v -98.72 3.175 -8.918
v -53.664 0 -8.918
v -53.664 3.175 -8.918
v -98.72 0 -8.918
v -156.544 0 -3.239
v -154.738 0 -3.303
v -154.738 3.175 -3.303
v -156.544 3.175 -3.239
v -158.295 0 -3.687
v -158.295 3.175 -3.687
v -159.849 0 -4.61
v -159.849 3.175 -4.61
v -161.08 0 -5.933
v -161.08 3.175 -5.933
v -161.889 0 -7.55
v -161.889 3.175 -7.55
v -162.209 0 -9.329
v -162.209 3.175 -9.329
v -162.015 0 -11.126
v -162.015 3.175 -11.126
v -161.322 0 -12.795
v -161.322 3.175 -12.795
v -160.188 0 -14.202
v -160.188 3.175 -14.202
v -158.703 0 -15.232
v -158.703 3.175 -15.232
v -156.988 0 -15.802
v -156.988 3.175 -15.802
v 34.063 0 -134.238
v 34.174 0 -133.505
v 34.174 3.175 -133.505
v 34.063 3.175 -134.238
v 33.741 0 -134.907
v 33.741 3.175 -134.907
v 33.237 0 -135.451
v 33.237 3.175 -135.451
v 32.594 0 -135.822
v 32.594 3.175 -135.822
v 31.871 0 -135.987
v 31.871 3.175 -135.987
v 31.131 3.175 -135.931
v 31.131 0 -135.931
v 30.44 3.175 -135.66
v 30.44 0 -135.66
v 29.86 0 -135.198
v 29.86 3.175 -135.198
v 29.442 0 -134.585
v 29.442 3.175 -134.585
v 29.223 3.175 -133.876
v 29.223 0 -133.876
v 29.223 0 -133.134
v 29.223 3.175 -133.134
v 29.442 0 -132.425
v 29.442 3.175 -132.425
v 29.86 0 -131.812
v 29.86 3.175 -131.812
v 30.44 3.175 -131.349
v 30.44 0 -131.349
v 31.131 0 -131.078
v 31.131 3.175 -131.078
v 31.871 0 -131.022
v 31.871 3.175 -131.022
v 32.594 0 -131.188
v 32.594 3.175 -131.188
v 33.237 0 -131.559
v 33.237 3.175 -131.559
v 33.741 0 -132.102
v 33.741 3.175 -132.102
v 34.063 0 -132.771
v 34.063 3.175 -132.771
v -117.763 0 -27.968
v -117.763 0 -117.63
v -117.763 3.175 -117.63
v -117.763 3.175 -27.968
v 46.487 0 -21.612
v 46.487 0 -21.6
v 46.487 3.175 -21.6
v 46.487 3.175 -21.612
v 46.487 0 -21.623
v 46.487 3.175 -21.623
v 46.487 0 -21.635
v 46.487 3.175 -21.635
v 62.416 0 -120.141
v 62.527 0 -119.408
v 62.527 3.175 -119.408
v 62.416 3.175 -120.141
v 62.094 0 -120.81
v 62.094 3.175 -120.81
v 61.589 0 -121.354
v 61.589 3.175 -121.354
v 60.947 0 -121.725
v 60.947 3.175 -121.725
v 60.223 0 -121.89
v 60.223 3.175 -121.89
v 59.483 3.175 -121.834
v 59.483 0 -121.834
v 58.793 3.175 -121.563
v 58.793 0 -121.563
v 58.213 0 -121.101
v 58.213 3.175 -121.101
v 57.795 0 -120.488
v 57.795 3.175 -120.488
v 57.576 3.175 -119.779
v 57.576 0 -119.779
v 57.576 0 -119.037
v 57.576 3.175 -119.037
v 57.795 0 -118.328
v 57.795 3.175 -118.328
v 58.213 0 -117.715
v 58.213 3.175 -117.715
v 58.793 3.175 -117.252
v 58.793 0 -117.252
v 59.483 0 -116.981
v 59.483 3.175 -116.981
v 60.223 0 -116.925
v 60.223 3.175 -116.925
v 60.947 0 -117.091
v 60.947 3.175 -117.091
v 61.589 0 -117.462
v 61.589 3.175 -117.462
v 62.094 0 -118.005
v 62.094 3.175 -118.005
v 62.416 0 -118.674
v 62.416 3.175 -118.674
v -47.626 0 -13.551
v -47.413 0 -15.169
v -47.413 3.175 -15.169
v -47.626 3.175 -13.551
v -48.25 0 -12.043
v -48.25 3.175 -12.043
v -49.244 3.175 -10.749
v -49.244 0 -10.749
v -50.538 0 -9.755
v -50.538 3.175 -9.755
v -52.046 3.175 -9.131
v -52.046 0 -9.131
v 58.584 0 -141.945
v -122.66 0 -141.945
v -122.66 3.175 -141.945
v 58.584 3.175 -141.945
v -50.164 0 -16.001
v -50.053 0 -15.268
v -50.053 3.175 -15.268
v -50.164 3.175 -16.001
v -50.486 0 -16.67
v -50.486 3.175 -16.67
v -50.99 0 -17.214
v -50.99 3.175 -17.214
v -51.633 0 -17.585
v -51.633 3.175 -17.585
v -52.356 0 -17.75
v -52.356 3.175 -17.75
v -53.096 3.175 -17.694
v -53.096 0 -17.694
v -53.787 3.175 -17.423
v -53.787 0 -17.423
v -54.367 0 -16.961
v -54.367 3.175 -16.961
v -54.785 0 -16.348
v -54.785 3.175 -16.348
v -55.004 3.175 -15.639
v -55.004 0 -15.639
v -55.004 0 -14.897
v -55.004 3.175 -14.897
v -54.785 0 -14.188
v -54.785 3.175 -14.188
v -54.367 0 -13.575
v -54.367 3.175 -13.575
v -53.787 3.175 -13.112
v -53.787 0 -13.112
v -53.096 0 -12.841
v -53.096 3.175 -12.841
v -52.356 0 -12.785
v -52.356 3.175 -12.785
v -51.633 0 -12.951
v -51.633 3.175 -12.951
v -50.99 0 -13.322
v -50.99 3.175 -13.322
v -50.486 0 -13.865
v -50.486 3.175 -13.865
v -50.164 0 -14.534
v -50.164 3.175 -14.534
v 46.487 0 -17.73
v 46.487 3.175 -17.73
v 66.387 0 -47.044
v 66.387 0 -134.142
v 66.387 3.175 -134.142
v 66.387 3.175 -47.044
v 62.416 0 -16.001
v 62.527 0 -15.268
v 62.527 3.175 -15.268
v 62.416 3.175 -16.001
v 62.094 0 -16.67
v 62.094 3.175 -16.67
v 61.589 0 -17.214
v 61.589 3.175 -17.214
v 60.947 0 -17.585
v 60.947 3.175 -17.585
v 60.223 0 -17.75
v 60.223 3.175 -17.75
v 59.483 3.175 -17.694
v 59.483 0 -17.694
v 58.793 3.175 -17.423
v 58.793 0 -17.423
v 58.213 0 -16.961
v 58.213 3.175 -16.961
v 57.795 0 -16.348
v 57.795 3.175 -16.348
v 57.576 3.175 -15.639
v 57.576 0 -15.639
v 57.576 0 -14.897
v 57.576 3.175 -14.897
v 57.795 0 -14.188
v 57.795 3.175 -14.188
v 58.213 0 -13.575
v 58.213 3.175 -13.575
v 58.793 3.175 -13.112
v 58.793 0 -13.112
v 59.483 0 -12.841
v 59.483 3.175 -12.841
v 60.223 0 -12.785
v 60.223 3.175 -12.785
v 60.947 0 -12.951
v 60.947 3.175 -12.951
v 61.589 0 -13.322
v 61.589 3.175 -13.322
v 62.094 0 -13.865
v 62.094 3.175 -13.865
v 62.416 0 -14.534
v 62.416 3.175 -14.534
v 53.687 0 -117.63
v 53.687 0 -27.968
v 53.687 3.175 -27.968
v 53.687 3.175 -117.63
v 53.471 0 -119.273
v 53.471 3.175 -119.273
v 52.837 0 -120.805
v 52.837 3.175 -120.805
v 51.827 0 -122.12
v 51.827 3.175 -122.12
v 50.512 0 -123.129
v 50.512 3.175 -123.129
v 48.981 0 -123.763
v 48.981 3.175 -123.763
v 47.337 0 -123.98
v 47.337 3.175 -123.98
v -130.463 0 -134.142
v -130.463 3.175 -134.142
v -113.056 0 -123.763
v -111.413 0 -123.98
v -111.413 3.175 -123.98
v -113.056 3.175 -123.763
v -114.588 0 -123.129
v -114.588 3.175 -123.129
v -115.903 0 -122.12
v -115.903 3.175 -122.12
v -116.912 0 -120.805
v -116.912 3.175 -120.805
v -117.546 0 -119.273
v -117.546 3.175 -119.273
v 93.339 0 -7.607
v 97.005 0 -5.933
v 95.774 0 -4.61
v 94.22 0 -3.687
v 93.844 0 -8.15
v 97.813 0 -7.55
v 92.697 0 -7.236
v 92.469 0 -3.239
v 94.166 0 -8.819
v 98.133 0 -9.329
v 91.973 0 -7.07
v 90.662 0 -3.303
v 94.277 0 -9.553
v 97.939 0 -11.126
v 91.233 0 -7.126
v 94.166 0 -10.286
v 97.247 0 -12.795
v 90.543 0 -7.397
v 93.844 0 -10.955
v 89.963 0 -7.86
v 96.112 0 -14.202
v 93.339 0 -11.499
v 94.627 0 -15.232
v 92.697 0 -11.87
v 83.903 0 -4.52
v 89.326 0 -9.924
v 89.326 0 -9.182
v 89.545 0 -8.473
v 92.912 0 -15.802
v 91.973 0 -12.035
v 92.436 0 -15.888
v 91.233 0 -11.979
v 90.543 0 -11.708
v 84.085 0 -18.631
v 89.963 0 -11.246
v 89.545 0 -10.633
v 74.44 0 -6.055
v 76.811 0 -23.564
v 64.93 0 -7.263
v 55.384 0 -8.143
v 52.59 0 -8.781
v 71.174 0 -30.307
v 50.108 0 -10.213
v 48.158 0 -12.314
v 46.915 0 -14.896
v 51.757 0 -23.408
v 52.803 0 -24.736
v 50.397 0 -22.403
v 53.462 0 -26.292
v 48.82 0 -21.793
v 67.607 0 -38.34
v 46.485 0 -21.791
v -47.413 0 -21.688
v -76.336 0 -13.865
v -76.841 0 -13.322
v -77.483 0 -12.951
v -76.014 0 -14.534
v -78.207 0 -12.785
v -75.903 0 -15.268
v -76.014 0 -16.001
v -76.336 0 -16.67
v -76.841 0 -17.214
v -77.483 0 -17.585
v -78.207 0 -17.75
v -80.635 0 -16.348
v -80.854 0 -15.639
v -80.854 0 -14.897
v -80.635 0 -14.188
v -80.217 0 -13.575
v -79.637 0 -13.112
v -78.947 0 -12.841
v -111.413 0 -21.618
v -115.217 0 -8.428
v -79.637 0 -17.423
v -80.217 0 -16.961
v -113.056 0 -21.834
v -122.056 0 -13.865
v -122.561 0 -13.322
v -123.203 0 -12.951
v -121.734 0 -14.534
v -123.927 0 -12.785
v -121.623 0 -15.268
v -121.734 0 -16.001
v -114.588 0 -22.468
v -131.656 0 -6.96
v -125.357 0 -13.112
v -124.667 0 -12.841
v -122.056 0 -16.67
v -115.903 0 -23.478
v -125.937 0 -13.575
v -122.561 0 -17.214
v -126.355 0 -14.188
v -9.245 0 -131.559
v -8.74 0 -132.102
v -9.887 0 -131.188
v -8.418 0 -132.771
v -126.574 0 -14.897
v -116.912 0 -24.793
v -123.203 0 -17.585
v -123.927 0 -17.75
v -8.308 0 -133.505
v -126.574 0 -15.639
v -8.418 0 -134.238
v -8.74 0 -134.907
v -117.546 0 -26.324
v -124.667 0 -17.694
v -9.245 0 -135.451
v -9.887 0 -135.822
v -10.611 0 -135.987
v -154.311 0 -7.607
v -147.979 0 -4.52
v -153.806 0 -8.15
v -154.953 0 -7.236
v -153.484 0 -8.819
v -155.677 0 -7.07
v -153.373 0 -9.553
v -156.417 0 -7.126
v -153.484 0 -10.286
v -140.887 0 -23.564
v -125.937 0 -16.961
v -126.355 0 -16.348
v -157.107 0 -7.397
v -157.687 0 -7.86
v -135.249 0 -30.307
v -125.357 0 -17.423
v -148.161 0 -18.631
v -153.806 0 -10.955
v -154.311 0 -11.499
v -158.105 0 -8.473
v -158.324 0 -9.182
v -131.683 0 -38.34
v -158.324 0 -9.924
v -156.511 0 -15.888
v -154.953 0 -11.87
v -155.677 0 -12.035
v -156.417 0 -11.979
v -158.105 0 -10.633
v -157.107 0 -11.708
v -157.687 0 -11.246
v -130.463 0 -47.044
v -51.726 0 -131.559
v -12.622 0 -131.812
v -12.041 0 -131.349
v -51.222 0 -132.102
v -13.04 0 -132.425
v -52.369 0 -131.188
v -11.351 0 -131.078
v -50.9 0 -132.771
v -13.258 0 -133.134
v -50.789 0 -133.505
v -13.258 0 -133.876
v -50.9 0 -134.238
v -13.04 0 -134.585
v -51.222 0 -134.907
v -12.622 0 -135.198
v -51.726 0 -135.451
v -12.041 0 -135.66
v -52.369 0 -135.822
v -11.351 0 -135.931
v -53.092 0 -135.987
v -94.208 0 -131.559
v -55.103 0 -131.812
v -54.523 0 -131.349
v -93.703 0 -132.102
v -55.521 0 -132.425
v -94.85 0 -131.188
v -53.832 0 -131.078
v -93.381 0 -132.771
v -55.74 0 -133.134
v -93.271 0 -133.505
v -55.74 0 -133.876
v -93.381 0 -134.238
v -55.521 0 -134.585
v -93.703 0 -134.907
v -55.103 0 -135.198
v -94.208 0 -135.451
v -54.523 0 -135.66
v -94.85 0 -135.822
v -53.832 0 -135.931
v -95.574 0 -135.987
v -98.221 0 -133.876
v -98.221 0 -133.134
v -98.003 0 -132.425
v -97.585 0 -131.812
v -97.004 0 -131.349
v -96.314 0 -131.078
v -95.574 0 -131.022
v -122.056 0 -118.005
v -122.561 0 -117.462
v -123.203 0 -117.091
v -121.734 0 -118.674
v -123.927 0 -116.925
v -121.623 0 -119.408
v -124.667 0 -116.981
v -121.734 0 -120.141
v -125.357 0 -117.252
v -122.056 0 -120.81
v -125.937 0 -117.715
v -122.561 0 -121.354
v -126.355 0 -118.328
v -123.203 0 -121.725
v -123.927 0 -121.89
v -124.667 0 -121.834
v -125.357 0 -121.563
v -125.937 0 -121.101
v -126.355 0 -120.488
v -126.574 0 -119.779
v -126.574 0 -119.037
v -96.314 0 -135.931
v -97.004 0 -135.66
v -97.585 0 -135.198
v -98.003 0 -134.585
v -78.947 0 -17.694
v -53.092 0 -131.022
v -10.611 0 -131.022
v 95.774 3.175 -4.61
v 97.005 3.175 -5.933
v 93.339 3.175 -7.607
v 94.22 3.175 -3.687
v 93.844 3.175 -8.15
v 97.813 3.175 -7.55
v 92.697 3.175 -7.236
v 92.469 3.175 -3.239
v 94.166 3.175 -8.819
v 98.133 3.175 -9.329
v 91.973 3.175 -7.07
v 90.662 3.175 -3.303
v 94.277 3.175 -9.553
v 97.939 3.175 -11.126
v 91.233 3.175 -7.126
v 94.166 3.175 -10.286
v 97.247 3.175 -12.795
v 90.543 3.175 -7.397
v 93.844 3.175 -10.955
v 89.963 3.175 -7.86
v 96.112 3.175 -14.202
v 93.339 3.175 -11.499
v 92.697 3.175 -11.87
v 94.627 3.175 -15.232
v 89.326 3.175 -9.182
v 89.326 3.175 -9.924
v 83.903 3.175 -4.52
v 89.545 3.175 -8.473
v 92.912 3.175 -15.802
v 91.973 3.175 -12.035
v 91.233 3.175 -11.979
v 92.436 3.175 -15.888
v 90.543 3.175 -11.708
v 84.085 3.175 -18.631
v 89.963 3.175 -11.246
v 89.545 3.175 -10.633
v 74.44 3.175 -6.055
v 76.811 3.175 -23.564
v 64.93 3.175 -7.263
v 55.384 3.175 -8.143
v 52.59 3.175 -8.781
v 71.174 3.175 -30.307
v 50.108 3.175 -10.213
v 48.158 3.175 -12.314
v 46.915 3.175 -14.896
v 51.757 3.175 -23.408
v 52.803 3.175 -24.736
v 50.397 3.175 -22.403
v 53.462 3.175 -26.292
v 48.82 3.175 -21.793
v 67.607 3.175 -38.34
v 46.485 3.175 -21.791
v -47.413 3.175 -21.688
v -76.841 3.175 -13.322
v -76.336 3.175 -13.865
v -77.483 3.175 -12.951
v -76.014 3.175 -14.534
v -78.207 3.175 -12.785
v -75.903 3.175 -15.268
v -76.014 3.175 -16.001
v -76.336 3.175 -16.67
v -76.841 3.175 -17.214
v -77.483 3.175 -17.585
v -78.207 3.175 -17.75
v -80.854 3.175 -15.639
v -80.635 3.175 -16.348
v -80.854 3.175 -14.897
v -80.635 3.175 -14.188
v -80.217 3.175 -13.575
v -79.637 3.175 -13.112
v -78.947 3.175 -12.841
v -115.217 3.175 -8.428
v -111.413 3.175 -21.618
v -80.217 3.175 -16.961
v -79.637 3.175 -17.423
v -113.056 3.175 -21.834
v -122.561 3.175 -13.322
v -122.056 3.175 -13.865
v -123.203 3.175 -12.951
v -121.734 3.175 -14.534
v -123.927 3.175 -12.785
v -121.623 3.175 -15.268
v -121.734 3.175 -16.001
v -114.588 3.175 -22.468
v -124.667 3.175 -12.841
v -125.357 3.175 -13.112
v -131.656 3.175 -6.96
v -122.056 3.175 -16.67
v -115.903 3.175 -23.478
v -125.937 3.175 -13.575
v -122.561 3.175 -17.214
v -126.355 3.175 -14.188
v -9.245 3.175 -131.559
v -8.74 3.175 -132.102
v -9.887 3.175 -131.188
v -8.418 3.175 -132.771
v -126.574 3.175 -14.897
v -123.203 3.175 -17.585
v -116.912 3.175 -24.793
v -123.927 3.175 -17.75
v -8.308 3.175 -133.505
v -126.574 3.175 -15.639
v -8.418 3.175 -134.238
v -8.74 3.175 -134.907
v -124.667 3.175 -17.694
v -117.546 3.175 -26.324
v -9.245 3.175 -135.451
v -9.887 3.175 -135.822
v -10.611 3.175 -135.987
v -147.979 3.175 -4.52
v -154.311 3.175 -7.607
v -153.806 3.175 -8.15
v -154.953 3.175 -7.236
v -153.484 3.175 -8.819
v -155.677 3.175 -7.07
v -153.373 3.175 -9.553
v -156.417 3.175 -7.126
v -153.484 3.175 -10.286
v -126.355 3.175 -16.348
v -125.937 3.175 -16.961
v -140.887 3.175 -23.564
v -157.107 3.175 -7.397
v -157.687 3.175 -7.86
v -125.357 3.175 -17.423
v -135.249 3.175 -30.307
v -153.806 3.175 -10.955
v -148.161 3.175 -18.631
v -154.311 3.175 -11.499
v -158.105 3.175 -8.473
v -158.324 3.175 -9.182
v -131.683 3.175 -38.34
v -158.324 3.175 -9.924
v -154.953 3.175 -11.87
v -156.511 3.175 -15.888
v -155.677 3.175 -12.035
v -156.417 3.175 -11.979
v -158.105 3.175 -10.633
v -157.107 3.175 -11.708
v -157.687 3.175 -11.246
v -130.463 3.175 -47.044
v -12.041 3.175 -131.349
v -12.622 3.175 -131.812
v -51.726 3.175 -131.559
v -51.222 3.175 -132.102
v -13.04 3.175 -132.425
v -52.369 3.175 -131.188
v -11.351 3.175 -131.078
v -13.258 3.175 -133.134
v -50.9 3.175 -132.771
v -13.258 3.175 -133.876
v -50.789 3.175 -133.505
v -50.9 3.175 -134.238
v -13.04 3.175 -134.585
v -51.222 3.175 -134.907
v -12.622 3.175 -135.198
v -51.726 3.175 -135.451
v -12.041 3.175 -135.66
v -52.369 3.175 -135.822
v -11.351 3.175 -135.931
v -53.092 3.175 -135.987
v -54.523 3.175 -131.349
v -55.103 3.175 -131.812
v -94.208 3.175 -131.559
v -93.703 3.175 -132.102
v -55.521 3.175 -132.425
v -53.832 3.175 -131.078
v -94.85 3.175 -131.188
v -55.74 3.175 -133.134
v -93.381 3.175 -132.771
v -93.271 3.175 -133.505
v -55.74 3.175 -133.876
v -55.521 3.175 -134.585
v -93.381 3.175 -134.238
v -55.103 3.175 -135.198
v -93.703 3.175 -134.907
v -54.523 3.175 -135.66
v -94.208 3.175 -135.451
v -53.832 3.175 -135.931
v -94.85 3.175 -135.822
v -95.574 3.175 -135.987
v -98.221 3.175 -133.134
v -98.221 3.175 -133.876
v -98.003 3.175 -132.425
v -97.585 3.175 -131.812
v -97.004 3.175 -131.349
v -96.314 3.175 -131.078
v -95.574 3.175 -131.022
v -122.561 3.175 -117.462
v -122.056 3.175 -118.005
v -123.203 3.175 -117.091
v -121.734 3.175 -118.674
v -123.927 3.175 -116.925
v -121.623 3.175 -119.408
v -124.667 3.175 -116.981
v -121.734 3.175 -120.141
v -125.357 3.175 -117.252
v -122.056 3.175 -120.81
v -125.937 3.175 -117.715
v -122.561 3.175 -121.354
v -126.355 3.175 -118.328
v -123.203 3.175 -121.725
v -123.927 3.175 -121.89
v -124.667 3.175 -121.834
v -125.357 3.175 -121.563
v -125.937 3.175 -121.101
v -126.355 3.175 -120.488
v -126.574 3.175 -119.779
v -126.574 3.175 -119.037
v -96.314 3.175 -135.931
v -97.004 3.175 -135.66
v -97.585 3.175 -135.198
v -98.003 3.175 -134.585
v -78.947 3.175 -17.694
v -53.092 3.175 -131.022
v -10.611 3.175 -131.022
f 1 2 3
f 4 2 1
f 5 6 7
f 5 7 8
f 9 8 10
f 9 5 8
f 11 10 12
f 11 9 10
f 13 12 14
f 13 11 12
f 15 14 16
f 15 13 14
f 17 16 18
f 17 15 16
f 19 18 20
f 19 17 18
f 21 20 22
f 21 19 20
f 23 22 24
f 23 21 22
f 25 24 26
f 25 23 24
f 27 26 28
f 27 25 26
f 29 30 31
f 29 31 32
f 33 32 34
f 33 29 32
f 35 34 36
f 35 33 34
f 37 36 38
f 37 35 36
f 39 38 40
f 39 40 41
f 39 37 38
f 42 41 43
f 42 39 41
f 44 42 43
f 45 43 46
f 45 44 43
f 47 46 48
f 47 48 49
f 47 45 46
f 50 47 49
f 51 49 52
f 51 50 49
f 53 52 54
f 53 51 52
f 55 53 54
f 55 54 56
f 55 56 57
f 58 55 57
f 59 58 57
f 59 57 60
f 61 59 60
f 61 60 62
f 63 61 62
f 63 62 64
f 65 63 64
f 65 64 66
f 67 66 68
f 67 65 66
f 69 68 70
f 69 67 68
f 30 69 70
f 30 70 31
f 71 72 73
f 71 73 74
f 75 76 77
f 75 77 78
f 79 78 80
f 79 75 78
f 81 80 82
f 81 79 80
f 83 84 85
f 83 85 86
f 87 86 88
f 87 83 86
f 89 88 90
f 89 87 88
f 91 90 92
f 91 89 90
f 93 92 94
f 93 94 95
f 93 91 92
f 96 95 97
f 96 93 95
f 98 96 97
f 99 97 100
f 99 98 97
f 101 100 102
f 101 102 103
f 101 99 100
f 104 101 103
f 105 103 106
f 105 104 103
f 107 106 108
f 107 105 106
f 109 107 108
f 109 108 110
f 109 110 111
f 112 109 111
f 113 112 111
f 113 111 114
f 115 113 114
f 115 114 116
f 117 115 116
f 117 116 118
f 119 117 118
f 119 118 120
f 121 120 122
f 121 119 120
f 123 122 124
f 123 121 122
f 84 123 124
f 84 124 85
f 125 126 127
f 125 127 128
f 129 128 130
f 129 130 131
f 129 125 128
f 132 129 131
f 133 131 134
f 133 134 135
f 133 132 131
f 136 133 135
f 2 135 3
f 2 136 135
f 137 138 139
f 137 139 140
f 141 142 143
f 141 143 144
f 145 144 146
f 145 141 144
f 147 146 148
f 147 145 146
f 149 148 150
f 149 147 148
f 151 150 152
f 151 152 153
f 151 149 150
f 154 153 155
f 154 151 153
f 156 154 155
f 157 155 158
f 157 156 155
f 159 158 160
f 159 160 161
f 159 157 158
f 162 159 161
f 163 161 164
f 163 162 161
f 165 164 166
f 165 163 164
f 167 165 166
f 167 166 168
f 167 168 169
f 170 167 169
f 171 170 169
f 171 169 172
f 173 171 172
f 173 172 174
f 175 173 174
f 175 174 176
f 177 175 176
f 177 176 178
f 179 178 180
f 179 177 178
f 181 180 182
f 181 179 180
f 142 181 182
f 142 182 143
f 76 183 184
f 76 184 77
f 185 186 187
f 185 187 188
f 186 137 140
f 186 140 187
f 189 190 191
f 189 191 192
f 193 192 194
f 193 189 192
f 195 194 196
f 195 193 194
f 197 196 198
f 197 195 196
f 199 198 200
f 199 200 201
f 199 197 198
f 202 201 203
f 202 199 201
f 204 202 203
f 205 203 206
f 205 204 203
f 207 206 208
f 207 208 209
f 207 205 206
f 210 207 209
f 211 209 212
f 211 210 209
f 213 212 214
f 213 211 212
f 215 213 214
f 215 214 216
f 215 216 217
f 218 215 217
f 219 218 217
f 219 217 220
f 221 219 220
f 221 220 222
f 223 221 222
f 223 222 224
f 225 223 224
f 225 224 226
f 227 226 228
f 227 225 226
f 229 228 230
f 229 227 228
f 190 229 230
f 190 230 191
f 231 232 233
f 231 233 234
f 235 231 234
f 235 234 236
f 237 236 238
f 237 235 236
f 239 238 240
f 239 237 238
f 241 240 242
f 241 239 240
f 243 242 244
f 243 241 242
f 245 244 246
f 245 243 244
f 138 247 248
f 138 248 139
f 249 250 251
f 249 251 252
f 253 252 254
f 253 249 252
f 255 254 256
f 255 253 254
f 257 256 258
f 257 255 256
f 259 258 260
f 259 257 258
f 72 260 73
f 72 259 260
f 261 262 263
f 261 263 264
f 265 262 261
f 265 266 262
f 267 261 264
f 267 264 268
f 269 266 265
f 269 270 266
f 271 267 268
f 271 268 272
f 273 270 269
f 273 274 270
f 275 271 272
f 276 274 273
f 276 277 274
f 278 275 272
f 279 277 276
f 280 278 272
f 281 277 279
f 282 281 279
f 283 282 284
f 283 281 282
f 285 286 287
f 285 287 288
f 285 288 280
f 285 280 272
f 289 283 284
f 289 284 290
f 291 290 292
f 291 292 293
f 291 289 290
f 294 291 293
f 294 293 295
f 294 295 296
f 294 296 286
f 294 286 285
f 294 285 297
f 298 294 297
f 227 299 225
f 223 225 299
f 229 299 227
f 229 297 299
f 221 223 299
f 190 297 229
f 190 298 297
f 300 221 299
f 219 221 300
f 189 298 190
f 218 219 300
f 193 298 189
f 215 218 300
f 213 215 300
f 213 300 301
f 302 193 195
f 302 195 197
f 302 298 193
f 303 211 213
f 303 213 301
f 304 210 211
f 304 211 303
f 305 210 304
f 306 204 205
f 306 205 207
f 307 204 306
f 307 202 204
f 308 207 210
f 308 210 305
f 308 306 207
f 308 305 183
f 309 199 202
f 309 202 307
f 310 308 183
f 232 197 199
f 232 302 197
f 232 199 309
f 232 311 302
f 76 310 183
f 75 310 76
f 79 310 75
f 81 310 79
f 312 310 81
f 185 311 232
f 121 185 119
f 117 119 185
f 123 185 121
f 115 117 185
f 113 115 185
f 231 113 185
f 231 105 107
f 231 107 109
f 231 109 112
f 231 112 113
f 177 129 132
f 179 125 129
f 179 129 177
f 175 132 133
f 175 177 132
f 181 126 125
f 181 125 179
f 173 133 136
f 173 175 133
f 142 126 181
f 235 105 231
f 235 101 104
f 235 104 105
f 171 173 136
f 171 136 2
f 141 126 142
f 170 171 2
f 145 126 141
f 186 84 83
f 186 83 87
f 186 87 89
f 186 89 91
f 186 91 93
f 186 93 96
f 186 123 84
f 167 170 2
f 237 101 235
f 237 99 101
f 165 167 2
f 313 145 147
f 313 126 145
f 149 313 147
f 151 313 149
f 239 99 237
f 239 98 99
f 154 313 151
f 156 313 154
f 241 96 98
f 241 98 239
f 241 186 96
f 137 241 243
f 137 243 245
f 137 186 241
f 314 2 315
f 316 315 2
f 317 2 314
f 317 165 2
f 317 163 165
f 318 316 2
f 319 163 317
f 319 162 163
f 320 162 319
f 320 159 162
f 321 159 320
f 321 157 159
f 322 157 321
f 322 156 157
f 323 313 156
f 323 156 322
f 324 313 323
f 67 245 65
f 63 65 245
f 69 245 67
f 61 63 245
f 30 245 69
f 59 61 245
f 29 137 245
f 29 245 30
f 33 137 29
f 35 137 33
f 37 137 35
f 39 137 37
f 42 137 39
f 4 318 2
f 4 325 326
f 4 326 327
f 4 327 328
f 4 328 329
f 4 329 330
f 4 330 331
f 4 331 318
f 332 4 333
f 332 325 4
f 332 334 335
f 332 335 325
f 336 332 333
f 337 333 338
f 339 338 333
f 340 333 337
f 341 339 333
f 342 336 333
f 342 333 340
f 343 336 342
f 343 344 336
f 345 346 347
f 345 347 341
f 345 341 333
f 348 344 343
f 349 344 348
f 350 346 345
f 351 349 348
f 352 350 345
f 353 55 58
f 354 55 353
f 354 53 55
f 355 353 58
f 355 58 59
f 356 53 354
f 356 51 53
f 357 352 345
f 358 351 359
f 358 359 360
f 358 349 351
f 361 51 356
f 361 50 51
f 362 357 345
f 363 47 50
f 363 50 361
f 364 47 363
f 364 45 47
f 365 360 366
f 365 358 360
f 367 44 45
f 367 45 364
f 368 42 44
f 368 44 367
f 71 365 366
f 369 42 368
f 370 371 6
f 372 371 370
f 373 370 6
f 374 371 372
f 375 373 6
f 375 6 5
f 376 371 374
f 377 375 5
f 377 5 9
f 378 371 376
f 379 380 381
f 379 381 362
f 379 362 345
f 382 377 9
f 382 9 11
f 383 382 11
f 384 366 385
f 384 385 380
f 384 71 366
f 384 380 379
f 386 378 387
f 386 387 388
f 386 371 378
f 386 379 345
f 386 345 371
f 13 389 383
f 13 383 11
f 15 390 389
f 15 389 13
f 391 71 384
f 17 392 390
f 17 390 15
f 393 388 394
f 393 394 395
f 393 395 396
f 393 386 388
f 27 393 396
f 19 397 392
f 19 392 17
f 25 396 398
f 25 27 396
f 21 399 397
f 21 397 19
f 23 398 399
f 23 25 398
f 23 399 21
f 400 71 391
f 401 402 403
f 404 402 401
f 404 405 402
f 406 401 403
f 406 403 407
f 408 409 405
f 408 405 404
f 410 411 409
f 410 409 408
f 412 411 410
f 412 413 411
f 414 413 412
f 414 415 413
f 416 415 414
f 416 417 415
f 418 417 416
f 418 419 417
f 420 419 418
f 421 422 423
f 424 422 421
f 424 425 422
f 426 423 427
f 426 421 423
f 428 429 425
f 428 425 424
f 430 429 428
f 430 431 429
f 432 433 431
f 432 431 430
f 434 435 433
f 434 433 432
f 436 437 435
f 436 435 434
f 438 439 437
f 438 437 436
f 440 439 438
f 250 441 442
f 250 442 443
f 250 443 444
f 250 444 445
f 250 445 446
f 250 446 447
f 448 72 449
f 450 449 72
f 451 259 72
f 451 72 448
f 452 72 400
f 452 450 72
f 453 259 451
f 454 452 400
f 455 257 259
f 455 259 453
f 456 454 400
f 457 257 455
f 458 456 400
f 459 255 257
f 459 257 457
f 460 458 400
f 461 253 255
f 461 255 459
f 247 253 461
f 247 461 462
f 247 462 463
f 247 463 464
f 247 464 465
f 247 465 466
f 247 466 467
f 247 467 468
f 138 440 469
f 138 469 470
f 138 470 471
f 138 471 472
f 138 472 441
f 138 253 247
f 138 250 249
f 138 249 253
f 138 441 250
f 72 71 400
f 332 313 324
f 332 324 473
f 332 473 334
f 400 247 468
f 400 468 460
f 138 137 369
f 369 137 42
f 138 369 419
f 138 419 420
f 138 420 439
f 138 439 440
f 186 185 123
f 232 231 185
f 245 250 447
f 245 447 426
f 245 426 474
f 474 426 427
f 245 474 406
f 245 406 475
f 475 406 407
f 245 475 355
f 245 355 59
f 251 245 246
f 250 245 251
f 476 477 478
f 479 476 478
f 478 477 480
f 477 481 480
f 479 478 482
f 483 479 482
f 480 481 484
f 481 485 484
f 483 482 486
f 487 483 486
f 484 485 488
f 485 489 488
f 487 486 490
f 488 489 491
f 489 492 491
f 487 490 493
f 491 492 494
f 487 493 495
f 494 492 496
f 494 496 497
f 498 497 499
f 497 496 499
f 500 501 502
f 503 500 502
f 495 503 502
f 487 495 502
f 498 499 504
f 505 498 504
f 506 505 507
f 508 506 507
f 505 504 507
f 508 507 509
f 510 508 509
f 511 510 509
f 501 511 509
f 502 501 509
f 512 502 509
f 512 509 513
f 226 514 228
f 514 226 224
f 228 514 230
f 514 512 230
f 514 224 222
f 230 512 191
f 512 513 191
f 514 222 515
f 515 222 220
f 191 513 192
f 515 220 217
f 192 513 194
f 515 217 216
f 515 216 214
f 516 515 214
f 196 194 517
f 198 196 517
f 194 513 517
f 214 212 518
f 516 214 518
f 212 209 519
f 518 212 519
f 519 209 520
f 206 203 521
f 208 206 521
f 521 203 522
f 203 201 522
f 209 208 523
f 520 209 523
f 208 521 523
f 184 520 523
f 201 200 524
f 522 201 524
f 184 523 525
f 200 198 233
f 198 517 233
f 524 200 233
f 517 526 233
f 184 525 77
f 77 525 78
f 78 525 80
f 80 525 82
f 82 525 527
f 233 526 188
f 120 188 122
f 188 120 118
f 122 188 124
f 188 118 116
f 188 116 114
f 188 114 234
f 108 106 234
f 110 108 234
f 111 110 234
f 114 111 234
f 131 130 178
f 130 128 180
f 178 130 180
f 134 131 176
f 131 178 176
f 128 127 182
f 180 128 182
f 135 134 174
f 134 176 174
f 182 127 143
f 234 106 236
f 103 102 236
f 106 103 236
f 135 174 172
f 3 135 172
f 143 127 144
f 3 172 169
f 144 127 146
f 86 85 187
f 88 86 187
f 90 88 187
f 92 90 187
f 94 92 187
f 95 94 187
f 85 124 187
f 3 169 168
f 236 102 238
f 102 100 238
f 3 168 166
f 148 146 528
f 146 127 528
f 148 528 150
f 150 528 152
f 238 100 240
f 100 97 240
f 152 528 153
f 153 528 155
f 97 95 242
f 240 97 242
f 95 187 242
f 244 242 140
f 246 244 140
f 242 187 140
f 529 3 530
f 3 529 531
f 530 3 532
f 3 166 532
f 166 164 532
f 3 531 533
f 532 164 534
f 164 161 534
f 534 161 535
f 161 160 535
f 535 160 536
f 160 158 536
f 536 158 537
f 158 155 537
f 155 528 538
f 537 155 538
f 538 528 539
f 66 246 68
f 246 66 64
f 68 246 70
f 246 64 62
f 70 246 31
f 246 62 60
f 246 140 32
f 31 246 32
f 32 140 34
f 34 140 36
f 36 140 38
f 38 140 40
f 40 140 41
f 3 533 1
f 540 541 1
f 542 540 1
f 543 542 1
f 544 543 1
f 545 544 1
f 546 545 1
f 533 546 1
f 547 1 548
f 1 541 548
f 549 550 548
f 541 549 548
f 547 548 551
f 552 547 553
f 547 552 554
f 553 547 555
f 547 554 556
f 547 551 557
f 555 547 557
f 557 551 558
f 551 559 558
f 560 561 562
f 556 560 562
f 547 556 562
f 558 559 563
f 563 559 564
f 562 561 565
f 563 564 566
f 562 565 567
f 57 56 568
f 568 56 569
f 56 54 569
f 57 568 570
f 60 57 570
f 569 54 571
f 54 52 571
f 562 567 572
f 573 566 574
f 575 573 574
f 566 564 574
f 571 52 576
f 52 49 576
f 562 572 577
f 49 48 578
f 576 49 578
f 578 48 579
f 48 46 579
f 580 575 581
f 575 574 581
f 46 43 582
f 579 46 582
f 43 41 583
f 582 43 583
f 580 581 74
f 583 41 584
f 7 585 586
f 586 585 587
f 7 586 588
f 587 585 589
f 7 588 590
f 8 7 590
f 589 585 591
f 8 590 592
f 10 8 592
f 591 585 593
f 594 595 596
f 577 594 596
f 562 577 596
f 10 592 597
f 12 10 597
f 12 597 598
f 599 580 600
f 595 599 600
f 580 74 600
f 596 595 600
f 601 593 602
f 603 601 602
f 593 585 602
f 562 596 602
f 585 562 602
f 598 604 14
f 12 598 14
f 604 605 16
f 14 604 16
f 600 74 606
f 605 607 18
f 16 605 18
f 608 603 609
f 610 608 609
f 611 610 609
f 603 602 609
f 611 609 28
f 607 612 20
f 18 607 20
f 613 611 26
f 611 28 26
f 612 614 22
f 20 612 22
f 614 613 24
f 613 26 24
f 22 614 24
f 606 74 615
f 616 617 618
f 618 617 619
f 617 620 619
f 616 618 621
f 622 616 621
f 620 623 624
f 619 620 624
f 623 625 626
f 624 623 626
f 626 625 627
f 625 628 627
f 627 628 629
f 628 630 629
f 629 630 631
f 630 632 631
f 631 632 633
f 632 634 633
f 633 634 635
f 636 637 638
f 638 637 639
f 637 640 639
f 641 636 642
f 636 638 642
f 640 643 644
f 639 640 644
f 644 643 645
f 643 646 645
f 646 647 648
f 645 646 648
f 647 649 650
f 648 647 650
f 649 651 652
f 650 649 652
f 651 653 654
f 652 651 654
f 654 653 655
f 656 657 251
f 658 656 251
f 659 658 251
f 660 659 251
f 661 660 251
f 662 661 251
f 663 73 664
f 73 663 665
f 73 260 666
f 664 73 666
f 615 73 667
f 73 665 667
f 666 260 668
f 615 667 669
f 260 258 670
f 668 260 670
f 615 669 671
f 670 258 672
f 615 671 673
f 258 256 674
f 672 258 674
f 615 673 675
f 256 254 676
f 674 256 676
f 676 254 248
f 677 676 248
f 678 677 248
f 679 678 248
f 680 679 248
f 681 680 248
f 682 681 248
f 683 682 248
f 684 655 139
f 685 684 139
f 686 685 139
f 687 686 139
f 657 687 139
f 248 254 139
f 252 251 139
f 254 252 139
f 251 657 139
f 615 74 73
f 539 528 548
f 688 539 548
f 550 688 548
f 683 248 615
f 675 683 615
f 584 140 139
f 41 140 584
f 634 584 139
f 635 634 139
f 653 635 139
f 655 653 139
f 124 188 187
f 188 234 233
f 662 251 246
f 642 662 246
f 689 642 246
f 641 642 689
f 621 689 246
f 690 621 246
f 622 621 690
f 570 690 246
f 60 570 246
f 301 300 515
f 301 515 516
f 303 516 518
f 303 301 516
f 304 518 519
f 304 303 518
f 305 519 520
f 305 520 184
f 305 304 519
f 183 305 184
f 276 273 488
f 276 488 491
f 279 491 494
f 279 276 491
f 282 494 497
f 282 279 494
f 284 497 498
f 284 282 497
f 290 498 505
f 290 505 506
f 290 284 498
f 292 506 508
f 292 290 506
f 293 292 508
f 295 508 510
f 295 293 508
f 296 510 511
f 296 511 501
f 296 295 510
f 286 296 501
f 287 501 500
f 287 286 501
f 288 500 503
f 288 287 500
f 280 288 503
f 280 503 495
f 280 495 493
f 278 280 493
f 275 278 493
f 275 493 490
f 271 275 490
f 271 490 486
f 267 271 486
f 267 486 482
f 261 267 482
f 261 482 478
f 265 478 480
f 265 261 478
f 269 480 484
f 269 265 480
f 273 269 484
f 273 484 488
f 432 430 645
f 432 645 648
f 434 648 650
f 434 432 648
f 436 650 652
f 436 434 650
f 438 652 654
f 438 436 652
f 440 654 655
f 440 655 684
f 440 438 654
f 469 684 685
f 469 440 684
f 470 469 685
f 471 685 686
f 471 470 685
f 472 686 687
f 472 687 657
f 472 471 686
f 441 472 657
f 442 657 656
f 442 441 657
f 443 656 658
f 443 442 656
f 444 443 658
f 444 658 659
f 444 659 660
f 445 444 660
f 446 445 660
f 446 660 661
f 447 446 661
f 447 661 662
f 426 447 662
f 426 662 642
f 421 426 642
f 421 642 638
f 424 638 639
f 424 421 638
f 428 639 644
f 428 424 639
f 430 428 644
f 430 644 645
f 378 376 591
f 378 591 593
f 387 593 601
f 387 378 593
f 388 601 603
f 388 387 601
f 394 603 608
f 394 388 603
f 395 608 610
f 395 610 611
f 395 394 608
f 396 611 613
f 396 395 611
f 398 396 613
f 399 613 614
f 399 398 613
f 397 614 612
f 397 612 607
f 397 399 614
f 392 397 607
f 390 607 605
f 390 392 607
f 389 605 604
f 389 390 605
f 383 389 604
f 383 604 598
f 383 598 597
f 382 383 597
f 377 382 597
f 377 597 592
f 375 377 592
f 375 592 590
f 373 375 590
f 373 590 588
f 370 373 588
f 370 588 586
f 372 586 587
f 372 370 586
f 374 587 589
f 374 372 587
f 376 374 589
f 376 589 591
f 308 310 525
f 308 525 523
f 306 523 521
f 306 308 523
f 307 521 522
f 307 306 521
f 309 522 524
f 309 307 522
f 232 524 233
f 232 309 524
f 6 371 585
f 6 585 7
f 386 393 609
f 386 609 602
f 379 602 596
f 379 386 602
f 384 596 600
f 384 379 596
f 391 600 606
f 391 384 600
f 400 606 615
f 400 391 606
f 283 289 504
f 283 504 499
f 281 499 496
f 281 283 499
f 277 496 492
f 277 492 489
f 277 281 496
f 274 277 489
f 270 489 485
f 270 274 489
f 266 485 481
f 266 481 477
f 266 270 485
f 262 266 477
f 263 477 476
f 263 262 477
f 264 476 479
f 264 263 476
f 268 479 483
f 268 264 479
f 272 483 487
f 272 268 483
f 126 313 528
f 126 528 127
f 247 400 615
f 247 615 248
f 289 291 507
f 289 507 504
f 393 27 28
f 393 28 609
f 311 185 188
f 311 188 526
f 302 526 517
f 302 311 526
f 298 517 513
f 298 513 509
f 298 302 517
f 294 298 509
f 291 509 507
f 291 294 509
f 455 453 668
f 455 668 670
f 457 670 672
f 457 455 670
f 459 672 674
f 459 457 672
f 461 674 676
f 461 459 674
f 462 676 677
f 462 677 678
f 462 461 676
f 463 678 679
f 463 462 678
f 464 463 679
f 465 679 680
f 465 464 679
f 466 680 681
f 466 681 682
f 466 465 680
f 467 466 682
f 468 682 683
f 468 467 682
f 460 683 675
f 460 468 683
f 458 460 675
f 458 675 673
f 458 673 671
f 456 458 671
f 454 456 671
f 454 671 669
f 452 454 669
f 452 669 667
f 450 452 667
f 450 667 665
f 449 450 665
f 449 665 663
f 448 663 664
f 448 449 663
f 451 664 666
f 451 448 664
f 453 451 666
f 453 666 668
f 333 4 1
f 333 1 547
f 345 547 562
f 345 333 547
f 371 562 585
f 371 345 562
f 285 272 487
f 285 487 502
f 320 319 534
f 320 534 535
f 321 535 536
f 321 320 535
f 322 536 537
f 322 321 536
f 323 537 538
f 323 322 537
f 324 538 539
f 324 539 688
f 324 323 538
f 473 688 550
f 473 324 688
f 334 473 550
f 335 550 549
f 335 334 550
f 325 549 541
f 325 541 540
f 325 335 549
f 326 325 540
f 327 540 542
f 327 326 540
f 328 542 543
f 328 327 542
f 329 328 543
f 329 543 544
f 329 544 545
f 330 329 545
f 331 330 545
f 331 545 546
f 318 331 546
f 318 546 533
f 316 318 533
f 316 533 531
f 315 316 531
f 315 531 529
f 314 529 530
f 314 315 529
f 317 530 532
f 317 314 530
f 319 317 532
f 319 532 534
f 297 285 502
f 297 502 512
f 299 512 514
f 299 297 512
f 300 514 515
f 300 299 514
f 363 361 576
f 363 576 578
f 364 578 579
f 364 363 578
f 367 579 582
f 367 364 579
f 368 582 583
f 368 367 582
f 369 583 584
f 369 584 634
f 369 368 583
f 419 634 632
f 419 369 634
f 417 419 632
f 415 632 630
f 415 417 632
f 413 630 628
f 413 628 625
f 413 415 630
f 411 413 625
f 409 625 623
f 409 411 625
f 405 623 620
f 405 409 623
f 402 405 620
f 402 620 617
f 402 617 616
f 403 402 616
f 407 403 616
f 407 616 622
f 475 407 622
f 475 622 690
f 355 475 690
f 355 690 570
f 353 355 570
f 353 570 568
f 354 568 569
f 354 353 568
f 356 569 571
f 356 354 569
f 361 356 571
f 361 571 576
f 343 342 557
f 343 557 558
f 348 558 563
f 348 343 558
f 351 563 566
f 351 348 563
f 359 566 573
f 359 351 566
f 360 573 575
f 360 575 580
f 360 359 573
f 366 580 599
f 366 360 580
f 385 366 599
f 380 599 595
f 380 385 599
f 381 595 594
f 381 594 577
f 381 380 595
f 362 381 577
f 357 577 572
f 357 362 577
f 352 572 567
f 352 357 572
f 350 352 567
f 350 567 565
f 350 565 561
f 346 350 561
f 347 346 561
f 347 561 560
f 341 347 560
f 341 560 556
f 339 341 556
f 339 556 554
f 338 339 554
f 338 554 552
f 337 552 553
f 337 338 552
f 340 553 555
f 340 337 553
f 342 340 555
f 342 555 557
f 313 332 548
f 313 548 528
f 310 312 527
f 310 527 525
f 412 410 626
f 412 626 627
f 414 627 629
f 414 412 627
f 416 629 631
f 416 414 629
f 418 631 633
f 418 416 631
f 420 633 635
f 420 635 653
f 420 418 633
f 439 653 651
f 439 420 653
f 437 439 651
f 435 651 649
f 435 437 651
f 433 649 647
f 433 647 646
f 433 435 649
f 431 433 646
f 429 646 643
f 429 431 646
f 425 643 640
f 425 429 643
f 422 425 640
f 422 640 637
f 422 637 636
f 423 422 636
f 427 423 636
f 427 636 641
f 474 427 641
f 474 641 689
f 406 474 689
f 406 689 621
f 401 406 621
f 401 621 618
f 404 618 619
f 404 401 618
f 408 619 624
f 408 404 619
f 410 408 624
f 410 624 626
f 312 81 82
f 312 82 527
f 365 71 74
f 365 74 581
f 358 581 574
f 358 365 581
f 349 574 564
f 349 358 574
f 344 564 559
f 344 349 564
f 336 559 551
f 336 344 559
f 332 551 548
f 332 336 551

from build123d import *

# Parameters (mm, degrees)
SKETCH1_R           = 2.4892
BOSS_EXTRUDE1_DEPTH = 3.175


with BuildPart() as part:
    # Sketch1 → Boss-Extrude1 (new body)
    with BuildSketch(Plane(origin=(0, 0, 0), x_dir=(1, 0, 0), z_dir=(0, 1, 0))):
        with BuildLine():
            Line((-32.037640644, 123.979709158), (-111.412640644, 123.979709158))
            ThreePointArc((-111.412640644, 123.979709158), (-115.902768704, 122.119837219), (-117.762640644, 117.629709158))
            Line((-117.762640644, 117.629709158), (-117.762640644, 27.967709158))
            ThreePointArc((-117.762640644, 27.967709158), (-115.902768704, 23.477581098), (-111.412640644, 21.617709158))
            Line((-111.412640644, 21.617709158), (-47.412584086, 21.687857346))
            Line((-47.412584086, 21.687857346), (-47.412584086, 15.168903158))
            ThreePointArc((-47.412584086, 15.168903158), (-49.243516418, 10.748641491), (-53.663778086, 8.917709158))
            Line((-53.663778086, 8.917709158), (-98.720178026, 8.917709158))
            ThreePointArc((-98.720178026, 8.917709158), (-123.447337141, 7.816048009), (-147.978557367, 4.519794164))
            Line((-147.978557367, 4.519794164), (-154.737719104, 3.303145051))
            ThreePointArc((-154.737719104, 3.303145051), (-162.112204751, 8.427787619), (-156.987562183, 15.802273266))
            Line((-156.987562183, 15.802273266), (-156.510910789, 15.888070517))
            ThreePointArc((-156.510910789, 15.888070517), (-137.832620256, 26.738584362), (-130.462640644, 47.043647486))
            Line((-130.462640644, 47.043647486), (-130.462640644, 134.142309925))
            Line((-130.462640644, 134.142309925), (-122.659506644, 141.945443925))
            Line((-122.659506644, 141.945443925), (58.584225356, 141.945443925))
            Line((58.584225356, 141.945443925), (66.387359356, 134.142309925))
            Line((66.387359356, 134.142309925), (66.387359356, 47.043647486))
            ThreePointArc((66.387359356, 47.043647486), (73.757338969, 26.738584362), (92.435629502, 15.888070517))
            Line((92.435629502, 15.888070517), (92.912280896, 15.802273266))
            ThreePointArc((92.912280896, 15.802273266), (98.036923464, 8.427787619), (90.662437817, 3.303145051))
            Line((90.662437817, 3.303145051), (83.90327608, 4.519794164))
            ThreePointArc((83.90327608, 4.519794164), (69.690534676, 6.700322348), (55.384073682, 8.143199745))
            ThreePointArc((55.384073682, 8.143199745), (49.05429115, 11.190619944), (46.487475356, 17.730067432))
            Line((46.487475356, 17.730067432), (46.487475356, 21.600342717))
            ThreePointArc((46.487475356, 21.600342717), (46.487422167, 21.617708833), (46.487262601, 21.635074297))
            Line((46.487262601, 21.635074297), (46.485354971, 21.790775541))
            Line((46.485354971, 21.790775541), (48.820465356, 21.793334972))
            ThreePointArc((48.820465356, 21.793334972), (52.324353596, 24.036756545), (53.687359356, 27.967709158))
            Line((53.687359356, 27.967709158), (53.687359356, 117.629709158))
            ThreePointArc((53.687359356, 117.629709158), (51.827487417, 122.119837219), (47.337359356, 123.979709158))
            Line((47.337359356, 123.979709158), (-32.037640644, 123.979709158))
        make_face()
        with Locations((60.037359356, 119.407709158)):
            Circle(SKETCH1_R, mode=Mode.SUBTRACT)
        with Locations((-52.542234775, 15.267709158)):
            Circle(SKETCH1_R, mode=Mode.SUBTRACT)
        with Locations((-78.392640644, 15.267709158)):
            Circle(SKETCH1_R, mode=Mode.SUBTRACT)
        with Locations((-10.796890644, 133.504709158)):
            Circle(SKETCH1_R, mode=Mode.SUBTRACT)
        with Locations((31.684609356, 133.504709158)):
            Circle(SKETCH1_R, mode=Mode.SUBTRACT)
        with Locations((91.787359356, 9.552709158)):
            Circle(SKETCH1_R, mode=Mode.SUBTRACT)
        with Locations((-53.278390644, 133.504709158)):
            Circle(SKETCH1_R, mode=Mode.SUBTRACT)
        with Locations((-95.759890644, 133.504709158)):
            Circle(SKETCH1_R, mode=Mode.SUBTRACT)
        with Locations((-124.112640644, 15.267709158)):
            Circle(SKETCH1_R, mode=Mode.SUBTRACT)
        with Locations((-155.862640644, 9.552709158)):
            Circle(SKETCH1_R, mode=Mode.SUBTRACT)
        with Locations((-124.112640644, 119.407709158)):
            Circle(SKETCH1_R, mode=Mode.SUBTRACT)
        with Locations((60.037359356, 15.267709158)):
            Circle(SKETCH1_R, mode=Mode.SUBTRACT)
    extrude(amount=BOSS_EXTRUDE1_DEPTH)


solid = part.part
